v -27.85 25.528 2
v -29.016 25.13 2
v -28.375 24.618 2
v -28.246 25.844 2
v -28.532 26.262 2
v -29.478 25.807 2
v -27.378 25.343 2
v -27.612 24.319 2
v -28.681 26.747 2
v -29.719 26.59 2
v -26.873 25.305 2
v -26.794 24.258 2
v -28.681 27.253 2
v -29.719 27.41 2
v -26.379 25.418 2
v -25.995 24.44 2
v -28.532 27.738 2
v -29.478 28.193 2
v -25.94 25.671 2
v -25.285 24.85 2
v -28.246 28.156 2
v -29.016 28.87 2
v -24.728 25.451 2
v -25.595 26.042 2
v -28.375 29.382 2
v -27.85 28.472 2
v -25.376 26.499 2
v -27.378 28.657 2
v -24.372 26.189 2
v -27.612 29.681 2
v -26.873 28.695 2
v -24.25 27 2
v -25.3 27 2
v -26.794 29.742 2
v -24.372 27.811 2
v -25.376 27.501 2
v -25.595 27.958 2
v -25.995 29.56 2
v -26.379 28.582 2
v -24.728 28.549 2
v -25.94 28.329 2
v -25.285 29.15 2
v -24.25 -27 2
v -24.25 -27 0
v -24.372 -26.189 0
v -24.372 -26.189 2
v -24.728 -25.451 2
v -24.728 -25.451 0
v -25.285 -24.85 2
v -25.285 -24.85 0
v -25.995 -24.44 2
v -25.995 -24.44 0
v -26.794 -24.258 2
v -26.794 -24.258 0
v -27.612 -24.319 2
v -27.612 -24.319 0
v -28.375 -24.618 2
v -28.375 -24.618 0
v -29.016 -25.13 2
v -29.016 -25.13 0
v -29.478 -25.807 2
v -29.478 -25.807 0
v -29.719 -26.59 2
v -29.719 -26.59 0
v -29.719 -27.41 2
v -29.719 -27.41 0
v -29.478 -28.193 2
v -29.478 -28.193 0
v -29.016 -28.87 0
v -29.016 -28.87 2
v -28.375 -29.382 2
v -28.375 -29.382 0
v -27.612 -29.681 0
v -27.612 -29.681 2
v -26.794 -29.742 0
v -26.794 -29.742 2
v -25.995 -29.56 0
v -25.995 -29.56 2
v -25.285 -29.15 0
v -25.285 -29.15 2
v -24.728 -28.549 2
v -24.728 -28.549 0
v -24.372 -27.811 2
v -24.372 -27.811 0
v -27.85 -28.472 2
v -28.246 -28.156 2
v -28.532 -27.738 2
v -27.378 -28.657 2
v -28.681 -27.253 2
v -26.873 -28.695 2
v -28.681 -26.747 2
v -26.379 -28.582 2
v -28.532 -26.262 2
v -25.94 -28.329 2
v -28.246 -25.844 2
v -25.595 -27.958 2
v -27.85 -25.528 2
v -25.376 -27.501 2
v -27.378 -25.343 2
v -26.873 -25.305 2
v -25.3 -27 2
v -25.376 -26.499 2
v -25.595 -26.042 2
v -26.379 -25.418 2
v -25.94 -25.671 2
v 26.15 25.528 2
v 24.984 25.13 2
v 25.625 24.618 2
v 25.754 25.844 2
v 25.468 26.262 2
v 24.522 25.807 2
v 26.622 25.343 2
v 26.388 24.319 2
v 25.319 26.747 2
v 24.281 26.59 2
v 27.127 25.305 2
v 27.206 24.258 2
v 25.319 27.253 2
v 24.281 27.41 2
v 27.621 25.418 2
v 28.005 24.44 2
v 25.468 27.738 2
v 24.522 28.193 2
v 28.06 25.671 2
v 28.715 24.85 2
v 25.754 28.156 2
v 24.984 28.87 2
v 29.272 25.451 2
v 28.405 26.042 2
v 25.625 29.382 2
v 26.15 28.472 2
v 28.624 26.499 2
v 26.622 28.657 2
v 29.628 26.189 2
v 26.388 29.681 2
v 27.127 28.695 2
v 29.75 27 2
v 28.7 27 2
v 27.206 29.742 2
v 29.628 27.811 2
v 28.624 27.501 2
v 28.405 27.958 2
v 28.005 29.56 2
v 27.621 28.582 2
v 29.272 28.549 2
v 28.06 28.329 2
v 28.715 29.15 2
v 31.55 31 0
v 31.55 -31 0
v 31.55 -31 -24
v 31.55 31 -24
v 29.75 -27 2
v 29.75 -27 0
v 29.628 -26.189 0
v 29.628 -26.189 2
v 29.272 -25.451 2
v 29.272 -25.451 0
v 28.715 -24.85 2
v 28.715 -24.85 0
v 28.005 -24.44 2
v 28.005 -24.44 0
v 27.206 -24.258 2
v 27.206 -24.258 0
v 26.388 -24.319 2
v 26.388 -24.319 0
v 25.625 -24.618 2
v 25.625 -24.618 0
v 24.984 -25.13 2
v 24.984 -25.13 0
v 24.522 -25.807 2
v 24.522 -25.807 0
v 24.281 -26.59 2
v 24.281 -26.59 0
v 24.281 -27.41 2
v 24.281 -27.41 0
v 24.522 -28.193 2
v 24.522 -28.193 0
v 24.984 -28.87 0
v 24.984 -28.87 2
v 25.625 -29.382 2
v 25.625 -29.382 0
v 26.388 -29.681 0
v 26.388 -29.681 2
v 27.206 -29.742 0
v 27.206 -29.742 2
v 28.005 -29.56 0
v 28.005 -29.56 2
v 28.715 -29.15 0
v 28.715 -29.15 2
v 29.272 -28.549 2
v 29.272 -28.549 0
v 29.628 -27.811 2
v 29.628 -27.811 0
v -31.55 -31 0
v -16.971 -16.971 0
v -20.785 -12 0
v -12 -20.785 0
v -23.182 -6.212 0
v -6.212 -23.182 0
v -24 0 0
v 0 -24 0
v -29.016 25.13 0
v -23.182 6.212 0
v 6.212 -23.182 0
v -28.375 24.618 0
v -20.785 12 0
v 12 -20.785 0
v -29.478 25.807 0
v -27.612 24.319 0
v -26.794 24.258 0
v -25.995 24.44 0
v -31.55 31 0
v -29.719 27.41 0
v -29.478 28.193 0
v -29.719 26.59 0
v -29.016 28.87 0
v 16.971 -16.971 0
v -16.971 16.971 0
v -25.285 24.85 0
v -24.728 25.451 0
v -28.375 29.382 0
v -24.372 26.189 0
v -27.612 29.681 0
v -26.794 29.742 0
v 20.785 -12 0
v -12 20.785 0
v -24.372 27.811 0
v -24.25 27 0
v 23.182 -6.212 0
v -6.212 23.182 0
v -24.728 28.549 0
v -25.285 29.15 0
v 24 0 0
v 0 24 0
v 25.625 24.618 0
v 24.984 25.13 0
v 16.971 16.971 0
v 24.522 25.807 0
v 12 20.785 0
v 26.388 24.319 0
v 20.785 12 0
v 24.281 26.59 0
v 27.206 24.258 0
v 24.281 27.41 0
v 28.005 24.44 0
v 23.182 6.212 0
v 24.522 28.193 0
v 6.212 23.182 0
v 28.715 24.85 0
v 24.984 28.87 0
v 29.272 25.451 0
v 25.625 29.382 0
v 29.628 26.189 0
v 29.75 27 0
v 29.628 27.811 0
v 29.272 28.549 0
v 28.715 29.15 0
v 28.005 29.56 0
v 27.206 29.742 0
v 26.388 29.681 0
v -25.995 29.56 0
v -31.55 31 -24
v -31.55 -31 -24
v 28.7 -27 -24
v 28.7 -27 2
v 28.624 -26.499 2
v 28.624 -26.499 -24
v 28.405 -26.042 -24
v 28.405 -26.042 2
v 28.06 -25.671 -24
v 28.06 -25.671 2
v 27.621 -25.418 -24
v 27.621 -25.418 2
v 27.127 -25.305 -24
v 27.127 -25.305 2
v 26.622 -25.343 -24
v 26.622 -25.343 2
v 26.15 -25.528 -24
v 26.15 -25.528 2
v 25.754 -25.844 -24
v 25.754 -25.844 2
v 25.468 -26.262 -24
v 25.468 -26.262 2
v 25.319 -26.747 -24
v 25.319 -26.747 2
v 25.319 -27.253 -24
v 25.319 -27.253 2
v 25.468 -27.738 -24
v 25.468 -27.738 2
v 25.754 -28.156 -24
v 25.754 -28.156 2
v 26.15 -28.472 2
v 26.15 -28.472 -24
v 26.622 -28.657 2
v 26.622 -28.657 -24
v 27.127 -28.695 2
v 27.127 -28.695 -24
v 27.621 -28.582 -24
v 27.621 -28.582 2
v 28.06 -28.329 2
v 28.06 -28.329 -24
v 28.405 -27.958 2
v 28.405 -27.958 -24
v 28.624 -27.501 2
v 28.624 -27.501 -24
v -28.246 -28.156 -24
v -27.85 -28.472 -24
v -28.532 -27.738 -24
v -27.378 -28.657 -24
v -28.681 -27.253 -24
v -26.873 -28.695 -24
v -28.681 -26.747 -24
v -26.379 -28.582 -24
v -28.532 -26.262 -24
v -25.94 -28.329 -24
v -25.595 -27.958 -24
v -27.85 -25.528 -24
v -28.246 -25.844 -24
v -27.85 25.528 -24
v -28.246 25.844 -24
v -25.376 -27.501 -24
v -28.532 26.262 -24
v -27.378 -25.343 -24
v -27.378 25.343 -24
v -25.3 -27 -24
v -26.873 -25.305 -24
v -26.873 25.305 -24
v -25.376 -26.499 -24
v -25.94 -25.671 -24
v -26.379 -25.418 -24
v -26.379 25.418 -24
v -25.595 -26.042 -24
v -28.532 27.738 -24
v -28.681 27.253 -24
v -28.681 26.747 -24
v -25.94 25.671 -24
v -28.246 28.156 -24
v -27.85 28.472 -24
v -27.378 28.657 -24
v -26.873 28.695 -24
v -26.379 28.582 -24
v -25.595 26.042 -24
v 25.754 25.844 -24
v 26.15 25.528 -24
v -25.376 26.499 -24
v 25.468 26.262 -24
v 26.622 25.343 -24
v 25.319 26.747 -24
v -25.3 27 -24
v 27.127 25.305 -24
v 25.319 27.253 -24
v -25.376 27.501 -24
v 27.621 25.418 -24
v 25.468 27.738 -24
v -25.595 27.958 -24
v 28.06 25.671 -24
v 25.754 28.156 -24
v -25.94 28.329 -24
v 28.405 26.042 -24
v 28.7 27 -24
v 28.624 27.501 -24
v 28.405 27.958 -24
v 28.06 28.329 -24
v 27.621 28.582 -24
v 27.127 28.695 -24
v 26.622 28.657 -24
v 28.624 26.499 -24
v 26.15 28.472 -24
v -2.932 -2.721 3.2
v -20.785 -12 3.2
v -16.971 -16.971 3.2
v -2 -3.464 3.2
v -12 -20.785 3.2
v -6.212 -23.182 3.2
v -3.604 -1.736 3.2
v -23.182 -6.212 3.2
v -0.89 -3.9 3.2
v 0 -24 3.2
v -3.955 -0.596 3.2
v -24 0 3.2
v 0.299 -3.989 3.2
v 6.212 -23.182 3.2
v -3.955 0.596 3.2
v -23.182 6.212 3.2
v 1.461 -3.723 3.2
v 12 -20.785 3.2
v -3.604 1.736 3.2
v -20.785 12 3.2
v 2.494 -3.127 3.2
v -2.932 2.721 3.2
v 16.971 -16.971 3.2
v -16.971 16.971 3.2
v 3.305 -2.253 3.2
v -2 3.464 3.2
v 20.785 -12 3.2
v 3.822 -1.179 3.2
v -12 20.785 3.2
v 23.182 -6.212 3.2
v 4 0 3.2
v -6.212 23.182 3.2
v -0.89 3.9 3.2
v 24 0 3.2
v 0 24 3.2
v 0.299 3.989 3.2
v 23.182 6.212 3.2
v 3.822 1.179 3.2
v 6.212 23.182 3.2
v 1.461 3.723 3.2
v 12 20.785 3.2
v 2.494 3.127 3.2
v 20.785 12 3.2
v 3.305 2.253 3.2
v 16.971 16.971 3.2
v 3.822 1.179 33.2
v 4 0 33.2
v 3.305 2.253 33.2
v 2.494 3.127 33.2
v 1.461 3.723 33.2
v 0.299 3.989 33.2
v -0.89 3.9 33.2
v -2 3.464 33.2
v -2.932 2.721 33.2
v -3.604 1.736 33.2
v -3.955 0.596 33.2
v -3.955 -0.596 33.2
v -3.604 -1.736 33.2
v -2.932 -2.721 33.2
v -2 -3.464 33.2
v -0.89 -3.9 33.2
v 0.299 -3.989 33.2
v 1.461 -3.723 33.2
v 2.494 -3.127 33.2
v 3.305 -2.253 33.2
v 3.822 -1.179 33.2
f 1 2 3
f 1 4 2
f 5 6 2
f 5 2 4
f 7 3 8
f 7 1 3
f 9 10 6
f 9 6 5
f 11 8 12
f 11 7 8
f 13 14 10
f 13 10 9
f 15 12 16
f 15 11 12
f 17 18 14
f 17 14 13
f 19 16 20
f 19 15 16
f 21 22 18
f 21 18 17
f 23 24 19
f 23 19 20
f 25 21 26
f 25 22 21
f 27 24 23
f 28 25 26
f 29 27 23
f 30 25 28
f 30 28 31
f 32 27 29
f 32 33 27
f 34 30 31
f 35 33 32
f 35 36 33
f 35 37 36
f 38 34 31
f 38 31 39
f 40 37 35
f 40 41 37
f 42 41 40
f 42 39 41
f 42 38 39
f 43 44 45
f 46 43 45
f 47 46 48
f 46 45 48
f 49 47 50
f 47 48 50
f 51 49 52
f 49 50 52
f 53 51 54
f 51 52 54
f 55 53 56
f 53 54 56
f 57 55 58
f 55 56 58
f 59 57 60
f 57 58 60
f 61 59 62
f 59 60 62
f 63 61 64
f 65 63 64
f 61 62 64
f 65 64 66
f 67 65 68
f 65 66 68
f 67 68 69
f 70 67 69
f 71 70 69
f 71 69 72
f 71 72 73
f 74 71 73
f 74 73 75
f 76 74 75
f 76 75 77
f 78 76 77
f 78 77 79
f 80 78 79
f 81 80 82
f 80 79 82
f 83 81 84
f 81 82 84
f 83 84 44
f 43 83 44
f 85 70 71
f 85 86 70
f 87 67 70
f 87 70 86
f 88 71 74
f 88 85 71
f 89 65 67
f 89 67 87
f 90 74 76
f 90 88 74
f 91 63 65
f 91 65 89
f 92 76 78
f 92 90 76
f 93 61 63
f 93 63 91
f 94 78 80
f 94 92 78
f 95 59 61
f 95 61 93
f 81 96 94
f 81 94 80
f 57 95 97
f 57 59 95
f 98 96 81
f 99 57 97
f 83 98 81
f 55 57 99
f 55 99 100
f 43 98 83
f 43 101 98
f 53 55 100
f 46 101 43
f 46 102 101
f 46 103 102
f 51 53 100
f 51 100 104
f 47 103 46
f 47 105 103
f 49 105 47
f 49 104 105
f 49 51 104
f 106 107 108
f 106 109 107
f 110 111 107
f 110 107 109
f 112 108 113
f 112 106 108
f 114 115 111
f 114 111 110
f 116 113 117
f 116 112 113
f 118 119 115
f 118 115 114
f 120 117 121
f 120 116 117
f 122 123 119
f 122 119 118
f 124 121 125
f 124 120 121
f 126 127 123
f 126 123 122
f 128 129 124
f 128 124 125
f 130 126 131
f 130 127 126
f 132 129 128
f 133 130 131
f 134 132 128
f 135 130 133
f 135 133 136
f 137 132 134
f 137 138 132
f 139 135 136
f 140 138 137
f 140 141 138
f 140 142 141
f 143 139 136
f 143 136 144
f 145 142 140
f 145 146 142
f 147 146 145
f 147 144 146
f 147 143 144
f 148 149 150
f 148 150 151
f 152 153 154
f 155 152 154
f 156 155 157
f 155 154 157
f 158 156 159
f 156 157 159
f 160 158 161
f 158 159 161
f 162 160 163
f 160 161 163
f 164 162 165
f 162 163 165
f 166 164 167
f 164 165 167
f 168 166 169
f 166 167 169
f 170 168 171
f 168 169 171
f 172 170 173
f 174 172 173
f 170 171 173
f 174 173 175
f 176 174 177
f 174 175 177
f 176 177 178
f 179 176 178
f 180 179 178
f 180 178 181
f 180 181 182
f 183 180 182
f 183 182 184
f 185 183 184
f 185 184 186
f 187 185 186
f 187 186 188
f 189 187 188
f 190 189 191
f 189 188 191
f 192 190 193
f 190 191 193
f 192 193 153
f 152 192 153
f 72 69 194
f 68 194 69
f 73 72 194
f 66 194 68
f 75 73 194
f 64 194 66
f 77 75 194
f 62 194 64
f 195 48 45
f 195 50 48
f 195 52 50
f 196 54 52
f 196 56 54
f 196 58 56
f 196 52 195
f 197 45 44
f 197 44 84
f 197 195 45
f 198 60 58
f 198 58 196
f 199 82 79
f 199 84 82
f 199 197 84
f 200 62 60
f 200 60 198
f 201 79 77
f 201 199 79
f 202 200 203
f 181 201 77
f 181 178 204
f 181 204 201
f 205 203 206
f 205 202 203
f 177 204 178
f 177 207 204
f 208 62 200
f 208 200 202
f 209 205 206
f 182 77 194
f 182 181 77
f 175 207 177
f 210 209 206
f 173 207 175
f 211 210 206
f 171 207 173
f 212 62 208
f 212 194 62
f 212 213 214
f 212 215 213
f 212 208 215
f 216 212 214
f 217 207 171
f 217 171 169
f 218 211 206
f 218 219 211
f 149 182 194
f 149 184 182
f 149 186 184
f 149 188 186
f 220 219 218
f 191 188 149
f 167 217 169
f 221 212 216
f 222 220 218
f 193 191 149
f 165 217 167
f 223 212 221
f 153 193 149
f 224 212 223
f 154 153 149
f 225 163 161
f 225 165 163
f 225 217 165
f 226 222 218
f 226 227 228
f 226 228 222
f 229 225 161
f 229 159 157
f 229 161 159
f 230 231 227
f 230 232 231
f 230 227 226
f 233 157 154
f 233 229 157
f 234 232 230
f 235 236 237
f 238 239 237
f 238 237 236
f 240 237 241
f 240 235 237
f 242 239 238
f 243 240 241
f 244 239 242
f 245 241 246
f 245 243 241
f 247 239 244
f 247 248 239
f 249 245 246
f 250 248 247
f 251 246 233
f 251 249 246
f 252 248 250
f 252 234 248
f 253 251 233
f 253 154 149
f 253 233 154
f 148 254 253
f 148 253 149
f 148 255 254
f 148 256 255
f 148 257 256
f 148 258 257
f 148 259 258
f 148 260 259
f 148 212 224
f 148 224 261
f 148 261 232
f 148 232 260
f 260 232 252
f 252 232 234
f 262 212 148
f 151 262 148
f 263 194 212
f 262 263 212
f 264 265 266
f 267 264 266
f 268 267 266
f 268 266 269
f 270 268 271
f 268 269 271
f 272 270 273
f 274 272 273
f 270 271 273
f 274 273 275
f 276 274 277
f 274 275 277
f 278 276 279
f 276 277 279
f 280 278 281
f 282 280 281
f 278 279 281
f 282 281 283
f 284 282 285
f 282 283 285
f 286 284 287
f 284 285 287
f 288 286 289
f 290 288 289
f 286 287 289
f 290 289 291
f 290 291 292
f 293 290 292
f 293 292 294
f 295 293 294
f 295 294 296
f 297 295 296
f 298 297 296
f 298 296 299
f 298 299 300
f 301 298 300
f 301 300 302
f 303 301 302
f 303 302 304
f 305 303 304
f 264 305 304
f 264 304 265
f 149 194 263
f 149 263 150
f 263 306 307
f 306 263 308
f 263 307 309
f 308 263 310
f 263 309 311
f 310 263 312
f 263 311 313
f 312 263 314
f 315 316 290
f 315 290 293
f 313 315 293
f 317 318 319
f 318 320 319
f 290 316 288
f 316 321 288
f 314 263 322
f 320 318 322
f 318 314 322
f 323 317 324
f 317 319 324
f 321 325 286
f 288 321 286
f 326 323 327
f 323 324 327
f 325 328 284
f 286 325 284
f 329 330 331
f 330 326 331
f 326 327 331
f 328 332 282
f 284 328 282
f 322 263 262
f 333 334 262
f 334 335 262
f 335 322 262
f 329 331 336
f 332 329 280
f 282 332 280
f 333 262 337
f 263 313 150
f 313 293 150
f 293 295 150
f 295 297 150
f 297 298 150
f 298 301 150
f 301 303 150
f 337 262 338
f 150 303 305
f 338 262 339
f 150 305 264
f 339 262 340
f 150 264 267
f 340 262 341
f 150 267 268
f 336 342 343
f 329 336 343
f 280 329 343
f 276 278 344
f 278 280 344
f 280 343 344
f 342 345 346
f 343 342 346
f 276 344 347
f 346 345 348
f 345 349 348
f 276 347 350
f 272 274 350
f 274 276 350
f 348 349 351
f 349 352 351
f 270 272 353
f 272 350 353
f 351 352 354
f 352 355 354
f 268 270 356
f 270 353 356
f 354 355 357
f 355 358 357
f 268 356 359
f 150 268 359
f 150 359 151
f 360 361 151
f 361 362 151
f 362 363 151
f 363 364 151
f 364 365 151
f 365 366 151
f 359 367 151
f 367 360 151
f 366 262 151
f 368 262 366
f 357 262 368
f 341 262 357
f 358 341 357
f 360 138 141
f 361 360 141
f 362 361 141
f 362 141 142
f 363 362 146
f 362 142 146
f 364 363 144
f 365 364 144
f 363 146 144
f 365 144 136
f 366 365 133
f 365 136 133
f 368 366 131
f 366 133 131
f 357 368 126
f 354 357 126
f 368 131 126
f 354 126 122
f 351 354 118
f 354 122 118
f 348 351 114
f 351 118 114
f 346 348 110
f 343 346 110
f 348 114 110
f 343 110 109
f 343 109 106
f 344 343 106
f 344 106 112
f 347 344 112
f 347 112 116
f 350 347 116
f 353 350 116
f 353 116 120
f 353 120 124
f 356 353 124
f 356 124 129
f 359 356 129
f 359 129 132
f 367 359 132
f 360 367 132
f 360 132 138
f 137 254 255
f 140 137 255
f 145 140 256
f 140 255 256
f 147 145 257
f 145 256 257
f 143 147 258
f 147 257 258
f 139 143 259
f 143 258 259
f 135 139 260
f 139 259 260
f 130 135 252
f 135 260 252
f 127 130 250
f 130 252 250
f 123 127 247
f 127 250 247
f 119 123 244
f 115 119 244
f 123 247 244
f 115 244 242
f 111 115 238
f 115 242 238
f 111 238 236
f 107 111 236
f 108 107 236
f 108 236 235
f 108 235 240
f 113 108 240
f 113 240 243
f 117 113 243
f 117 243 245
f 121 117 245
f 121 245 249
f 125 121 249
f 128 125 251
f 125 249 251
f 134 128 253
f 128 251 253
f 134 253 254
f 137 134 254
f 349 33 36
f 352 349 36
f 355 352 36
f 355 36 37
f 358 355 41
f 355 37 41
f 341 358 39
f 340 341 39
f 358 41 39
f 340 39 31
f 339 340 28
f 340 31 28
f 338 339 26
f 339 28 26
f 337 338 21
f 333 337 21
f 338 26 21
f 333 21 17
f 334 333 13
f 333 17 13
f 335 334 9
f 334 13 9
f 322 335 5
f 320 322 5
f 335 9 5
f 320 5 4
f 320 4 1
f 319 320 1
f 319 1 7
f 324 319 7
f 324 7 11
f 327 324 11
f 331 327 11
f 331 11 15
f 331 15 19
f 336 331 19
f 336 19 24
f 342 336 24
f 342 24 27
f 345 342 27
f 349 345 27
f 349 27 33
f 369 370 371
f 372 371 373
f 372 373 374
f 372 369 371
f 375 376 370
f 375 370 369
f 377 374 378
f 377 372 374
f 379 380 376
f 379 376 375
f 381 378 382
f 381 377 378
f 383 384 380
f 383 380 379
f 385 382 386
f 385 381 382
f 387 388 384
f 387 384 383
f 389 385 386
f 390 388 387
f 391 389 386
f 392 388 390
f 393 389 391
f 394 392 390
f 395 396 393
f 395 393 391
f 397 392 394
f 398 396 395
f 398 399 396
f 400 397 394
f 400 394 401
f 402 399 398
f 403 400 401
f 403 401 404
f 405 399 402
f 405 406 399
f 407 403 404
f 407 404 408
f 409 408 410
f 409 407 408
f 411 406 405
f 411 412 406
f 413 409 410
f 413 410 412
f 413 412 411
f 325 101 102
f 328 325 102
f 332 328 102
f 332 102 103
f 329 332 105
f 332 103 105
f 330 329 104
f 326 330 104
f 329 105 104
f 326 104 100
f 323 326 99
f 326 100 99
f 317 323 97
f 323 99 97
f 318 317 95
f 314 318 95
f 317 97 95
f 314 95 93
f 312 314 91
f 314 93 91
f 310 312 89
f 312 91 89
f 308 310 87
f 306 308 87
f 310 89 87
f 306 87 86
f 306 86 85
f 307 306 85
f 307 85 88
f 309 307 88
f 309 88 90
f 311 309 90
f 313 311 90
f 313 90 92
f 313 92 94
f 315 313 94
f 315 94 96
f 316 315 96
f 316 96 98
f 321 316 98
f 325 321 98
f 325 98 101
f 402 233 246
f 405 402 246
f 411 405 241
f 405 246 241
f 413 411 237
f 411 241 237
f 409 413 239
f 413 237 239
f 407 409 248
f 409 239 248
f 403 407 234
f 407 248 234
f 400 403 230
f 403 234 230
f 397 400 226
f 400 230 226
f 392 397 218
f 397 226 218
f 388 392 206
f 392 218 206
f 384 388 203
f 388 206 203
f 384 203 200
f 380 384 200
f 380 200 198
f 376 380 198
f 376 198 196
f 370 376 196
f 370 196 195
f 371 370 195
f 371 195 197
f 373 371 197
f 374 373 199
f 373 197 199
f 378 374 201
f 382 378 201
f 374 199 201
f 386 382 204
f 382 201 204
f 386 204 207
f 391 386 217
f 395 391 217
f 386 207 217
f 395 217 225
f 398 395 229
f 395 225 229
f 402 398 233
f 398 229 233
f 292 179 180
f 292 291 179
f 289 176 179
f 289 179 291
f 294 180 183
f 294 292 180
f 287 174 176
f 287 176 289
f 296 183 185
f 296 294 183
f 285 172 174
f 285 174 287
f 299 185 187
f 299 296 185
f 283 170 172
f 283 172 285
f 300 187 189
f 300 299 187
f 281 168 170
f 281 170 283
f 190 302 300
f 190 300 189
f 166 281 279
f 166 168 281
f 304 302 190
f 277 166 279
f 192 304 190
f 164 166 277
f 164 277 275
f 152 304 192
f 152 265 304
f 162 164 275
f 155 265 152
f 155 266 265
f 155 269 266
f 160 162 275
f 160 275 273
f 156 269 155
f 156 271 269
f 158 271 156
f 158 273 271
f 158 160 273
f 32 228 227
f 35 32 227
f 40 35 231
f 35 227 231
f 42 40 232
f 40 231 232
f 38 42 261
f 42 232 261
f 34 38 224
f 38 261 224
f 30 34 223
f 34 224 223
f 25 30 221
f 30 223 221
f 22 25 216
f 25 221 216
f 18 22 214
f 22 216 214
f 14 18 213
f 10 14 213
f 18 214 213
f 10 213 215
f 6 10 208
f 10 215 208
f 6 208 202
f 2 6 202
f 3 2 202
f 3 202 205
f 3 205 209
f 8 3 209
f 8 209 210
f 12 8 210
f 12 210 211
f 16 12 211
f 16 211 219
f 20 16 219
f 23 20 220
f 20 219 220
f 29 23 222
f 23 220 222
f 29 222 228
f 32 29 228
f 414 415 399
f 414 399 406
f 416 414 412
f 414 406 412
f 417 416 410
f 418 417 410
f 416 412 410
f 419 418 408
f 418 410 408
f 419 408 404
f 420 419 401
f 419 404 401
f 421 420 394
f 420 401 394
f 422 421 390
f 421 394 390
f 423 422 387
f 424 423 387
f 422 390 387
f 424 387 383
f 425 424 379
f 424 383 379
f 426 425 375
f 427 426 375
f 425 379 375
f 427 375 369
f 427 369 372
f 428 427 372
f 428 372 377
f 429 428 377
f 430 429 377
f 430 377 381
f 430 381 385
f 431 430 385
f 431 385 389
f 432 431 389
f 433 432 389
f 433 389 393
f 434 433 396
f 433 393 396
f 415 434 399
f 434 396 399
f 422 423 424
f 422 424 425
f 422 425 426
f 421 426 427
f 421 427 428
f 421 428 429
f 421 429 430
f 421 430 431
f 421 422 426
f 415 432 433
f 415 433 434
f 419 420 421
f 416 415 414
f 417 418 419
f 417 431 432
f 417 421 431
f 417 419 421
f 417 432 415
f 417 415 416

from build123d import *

# Parameters (mm, degrees)
SKETCH_W     = 63.1
SKETCH_H     = 62
PAD_DEPTH    = 24
SKETCH001_R  = 24
PAD001_DEPTH = 3.2
SKETCH002_R  = 4
PAD002_DEPTH = 30
SKETCH003_R  = 2.75
PAD003_DEPTH = 2
SKETCH004_R  = 1.7
HOLE_DEPTH   = 26.001


with BuildPart() as part:
    # Sketch → Pad (new body)
    with BuildSketch(Plane.XY):
        Rectangle(SKETCH_W, SKETCH_H)
    extrude(amount=-PAD_DEPTH)

    # Sketch001 (on Face5 of Pad) → Pad001 (join)
    with BuildSketch(Plane.XY):
        Circle(SKETCH001_R)
    extrude(amount=PAD001_DEPTH)

    # Sketch002 (on Face8 of Pad001) → Pad002 (join)
    with BuildSketch(Plane.XY.offset(3.2)):
        Circle(SKETCH002_R)
    extrude(amount=PAD002_DEPTH)

    # Sketch003 (on Face4 of Pad002) → Pad003 (join)
    with BuildSketch(Plane.XY):
        with Locations((-27, 27)):
            Circle(SKETCH003_R)
        with Locations((27, 27)):
            Circle(SKETCH003_R)
        with Locations((-27, -27)):
            Circle(SKETCH003_R)
        with Locations((27, -27)):
            Circle(SKETCH003_R)
    extrude(amount=PAD003_DEPTH)

    # Sketch004 (on Face13 of Pad003) → Hole (cut, through all)
    with BuildSketch(Plane.XY.offset(2)):
        with Locations((-27, 27)):
            Circle(SKETCH004_R)
        with Locations((27, 27)):
            Circle(SKETCH004_R)
        with Locations((27, -27)):
            Circle(SKETCH004_R)
        with Locations((-27, -27)):
            Circle(SKETCH004_R)
    extrude(amount=-HOLE_DEPTH, mode=Mode.SUBTRACT)


solid = part.part
